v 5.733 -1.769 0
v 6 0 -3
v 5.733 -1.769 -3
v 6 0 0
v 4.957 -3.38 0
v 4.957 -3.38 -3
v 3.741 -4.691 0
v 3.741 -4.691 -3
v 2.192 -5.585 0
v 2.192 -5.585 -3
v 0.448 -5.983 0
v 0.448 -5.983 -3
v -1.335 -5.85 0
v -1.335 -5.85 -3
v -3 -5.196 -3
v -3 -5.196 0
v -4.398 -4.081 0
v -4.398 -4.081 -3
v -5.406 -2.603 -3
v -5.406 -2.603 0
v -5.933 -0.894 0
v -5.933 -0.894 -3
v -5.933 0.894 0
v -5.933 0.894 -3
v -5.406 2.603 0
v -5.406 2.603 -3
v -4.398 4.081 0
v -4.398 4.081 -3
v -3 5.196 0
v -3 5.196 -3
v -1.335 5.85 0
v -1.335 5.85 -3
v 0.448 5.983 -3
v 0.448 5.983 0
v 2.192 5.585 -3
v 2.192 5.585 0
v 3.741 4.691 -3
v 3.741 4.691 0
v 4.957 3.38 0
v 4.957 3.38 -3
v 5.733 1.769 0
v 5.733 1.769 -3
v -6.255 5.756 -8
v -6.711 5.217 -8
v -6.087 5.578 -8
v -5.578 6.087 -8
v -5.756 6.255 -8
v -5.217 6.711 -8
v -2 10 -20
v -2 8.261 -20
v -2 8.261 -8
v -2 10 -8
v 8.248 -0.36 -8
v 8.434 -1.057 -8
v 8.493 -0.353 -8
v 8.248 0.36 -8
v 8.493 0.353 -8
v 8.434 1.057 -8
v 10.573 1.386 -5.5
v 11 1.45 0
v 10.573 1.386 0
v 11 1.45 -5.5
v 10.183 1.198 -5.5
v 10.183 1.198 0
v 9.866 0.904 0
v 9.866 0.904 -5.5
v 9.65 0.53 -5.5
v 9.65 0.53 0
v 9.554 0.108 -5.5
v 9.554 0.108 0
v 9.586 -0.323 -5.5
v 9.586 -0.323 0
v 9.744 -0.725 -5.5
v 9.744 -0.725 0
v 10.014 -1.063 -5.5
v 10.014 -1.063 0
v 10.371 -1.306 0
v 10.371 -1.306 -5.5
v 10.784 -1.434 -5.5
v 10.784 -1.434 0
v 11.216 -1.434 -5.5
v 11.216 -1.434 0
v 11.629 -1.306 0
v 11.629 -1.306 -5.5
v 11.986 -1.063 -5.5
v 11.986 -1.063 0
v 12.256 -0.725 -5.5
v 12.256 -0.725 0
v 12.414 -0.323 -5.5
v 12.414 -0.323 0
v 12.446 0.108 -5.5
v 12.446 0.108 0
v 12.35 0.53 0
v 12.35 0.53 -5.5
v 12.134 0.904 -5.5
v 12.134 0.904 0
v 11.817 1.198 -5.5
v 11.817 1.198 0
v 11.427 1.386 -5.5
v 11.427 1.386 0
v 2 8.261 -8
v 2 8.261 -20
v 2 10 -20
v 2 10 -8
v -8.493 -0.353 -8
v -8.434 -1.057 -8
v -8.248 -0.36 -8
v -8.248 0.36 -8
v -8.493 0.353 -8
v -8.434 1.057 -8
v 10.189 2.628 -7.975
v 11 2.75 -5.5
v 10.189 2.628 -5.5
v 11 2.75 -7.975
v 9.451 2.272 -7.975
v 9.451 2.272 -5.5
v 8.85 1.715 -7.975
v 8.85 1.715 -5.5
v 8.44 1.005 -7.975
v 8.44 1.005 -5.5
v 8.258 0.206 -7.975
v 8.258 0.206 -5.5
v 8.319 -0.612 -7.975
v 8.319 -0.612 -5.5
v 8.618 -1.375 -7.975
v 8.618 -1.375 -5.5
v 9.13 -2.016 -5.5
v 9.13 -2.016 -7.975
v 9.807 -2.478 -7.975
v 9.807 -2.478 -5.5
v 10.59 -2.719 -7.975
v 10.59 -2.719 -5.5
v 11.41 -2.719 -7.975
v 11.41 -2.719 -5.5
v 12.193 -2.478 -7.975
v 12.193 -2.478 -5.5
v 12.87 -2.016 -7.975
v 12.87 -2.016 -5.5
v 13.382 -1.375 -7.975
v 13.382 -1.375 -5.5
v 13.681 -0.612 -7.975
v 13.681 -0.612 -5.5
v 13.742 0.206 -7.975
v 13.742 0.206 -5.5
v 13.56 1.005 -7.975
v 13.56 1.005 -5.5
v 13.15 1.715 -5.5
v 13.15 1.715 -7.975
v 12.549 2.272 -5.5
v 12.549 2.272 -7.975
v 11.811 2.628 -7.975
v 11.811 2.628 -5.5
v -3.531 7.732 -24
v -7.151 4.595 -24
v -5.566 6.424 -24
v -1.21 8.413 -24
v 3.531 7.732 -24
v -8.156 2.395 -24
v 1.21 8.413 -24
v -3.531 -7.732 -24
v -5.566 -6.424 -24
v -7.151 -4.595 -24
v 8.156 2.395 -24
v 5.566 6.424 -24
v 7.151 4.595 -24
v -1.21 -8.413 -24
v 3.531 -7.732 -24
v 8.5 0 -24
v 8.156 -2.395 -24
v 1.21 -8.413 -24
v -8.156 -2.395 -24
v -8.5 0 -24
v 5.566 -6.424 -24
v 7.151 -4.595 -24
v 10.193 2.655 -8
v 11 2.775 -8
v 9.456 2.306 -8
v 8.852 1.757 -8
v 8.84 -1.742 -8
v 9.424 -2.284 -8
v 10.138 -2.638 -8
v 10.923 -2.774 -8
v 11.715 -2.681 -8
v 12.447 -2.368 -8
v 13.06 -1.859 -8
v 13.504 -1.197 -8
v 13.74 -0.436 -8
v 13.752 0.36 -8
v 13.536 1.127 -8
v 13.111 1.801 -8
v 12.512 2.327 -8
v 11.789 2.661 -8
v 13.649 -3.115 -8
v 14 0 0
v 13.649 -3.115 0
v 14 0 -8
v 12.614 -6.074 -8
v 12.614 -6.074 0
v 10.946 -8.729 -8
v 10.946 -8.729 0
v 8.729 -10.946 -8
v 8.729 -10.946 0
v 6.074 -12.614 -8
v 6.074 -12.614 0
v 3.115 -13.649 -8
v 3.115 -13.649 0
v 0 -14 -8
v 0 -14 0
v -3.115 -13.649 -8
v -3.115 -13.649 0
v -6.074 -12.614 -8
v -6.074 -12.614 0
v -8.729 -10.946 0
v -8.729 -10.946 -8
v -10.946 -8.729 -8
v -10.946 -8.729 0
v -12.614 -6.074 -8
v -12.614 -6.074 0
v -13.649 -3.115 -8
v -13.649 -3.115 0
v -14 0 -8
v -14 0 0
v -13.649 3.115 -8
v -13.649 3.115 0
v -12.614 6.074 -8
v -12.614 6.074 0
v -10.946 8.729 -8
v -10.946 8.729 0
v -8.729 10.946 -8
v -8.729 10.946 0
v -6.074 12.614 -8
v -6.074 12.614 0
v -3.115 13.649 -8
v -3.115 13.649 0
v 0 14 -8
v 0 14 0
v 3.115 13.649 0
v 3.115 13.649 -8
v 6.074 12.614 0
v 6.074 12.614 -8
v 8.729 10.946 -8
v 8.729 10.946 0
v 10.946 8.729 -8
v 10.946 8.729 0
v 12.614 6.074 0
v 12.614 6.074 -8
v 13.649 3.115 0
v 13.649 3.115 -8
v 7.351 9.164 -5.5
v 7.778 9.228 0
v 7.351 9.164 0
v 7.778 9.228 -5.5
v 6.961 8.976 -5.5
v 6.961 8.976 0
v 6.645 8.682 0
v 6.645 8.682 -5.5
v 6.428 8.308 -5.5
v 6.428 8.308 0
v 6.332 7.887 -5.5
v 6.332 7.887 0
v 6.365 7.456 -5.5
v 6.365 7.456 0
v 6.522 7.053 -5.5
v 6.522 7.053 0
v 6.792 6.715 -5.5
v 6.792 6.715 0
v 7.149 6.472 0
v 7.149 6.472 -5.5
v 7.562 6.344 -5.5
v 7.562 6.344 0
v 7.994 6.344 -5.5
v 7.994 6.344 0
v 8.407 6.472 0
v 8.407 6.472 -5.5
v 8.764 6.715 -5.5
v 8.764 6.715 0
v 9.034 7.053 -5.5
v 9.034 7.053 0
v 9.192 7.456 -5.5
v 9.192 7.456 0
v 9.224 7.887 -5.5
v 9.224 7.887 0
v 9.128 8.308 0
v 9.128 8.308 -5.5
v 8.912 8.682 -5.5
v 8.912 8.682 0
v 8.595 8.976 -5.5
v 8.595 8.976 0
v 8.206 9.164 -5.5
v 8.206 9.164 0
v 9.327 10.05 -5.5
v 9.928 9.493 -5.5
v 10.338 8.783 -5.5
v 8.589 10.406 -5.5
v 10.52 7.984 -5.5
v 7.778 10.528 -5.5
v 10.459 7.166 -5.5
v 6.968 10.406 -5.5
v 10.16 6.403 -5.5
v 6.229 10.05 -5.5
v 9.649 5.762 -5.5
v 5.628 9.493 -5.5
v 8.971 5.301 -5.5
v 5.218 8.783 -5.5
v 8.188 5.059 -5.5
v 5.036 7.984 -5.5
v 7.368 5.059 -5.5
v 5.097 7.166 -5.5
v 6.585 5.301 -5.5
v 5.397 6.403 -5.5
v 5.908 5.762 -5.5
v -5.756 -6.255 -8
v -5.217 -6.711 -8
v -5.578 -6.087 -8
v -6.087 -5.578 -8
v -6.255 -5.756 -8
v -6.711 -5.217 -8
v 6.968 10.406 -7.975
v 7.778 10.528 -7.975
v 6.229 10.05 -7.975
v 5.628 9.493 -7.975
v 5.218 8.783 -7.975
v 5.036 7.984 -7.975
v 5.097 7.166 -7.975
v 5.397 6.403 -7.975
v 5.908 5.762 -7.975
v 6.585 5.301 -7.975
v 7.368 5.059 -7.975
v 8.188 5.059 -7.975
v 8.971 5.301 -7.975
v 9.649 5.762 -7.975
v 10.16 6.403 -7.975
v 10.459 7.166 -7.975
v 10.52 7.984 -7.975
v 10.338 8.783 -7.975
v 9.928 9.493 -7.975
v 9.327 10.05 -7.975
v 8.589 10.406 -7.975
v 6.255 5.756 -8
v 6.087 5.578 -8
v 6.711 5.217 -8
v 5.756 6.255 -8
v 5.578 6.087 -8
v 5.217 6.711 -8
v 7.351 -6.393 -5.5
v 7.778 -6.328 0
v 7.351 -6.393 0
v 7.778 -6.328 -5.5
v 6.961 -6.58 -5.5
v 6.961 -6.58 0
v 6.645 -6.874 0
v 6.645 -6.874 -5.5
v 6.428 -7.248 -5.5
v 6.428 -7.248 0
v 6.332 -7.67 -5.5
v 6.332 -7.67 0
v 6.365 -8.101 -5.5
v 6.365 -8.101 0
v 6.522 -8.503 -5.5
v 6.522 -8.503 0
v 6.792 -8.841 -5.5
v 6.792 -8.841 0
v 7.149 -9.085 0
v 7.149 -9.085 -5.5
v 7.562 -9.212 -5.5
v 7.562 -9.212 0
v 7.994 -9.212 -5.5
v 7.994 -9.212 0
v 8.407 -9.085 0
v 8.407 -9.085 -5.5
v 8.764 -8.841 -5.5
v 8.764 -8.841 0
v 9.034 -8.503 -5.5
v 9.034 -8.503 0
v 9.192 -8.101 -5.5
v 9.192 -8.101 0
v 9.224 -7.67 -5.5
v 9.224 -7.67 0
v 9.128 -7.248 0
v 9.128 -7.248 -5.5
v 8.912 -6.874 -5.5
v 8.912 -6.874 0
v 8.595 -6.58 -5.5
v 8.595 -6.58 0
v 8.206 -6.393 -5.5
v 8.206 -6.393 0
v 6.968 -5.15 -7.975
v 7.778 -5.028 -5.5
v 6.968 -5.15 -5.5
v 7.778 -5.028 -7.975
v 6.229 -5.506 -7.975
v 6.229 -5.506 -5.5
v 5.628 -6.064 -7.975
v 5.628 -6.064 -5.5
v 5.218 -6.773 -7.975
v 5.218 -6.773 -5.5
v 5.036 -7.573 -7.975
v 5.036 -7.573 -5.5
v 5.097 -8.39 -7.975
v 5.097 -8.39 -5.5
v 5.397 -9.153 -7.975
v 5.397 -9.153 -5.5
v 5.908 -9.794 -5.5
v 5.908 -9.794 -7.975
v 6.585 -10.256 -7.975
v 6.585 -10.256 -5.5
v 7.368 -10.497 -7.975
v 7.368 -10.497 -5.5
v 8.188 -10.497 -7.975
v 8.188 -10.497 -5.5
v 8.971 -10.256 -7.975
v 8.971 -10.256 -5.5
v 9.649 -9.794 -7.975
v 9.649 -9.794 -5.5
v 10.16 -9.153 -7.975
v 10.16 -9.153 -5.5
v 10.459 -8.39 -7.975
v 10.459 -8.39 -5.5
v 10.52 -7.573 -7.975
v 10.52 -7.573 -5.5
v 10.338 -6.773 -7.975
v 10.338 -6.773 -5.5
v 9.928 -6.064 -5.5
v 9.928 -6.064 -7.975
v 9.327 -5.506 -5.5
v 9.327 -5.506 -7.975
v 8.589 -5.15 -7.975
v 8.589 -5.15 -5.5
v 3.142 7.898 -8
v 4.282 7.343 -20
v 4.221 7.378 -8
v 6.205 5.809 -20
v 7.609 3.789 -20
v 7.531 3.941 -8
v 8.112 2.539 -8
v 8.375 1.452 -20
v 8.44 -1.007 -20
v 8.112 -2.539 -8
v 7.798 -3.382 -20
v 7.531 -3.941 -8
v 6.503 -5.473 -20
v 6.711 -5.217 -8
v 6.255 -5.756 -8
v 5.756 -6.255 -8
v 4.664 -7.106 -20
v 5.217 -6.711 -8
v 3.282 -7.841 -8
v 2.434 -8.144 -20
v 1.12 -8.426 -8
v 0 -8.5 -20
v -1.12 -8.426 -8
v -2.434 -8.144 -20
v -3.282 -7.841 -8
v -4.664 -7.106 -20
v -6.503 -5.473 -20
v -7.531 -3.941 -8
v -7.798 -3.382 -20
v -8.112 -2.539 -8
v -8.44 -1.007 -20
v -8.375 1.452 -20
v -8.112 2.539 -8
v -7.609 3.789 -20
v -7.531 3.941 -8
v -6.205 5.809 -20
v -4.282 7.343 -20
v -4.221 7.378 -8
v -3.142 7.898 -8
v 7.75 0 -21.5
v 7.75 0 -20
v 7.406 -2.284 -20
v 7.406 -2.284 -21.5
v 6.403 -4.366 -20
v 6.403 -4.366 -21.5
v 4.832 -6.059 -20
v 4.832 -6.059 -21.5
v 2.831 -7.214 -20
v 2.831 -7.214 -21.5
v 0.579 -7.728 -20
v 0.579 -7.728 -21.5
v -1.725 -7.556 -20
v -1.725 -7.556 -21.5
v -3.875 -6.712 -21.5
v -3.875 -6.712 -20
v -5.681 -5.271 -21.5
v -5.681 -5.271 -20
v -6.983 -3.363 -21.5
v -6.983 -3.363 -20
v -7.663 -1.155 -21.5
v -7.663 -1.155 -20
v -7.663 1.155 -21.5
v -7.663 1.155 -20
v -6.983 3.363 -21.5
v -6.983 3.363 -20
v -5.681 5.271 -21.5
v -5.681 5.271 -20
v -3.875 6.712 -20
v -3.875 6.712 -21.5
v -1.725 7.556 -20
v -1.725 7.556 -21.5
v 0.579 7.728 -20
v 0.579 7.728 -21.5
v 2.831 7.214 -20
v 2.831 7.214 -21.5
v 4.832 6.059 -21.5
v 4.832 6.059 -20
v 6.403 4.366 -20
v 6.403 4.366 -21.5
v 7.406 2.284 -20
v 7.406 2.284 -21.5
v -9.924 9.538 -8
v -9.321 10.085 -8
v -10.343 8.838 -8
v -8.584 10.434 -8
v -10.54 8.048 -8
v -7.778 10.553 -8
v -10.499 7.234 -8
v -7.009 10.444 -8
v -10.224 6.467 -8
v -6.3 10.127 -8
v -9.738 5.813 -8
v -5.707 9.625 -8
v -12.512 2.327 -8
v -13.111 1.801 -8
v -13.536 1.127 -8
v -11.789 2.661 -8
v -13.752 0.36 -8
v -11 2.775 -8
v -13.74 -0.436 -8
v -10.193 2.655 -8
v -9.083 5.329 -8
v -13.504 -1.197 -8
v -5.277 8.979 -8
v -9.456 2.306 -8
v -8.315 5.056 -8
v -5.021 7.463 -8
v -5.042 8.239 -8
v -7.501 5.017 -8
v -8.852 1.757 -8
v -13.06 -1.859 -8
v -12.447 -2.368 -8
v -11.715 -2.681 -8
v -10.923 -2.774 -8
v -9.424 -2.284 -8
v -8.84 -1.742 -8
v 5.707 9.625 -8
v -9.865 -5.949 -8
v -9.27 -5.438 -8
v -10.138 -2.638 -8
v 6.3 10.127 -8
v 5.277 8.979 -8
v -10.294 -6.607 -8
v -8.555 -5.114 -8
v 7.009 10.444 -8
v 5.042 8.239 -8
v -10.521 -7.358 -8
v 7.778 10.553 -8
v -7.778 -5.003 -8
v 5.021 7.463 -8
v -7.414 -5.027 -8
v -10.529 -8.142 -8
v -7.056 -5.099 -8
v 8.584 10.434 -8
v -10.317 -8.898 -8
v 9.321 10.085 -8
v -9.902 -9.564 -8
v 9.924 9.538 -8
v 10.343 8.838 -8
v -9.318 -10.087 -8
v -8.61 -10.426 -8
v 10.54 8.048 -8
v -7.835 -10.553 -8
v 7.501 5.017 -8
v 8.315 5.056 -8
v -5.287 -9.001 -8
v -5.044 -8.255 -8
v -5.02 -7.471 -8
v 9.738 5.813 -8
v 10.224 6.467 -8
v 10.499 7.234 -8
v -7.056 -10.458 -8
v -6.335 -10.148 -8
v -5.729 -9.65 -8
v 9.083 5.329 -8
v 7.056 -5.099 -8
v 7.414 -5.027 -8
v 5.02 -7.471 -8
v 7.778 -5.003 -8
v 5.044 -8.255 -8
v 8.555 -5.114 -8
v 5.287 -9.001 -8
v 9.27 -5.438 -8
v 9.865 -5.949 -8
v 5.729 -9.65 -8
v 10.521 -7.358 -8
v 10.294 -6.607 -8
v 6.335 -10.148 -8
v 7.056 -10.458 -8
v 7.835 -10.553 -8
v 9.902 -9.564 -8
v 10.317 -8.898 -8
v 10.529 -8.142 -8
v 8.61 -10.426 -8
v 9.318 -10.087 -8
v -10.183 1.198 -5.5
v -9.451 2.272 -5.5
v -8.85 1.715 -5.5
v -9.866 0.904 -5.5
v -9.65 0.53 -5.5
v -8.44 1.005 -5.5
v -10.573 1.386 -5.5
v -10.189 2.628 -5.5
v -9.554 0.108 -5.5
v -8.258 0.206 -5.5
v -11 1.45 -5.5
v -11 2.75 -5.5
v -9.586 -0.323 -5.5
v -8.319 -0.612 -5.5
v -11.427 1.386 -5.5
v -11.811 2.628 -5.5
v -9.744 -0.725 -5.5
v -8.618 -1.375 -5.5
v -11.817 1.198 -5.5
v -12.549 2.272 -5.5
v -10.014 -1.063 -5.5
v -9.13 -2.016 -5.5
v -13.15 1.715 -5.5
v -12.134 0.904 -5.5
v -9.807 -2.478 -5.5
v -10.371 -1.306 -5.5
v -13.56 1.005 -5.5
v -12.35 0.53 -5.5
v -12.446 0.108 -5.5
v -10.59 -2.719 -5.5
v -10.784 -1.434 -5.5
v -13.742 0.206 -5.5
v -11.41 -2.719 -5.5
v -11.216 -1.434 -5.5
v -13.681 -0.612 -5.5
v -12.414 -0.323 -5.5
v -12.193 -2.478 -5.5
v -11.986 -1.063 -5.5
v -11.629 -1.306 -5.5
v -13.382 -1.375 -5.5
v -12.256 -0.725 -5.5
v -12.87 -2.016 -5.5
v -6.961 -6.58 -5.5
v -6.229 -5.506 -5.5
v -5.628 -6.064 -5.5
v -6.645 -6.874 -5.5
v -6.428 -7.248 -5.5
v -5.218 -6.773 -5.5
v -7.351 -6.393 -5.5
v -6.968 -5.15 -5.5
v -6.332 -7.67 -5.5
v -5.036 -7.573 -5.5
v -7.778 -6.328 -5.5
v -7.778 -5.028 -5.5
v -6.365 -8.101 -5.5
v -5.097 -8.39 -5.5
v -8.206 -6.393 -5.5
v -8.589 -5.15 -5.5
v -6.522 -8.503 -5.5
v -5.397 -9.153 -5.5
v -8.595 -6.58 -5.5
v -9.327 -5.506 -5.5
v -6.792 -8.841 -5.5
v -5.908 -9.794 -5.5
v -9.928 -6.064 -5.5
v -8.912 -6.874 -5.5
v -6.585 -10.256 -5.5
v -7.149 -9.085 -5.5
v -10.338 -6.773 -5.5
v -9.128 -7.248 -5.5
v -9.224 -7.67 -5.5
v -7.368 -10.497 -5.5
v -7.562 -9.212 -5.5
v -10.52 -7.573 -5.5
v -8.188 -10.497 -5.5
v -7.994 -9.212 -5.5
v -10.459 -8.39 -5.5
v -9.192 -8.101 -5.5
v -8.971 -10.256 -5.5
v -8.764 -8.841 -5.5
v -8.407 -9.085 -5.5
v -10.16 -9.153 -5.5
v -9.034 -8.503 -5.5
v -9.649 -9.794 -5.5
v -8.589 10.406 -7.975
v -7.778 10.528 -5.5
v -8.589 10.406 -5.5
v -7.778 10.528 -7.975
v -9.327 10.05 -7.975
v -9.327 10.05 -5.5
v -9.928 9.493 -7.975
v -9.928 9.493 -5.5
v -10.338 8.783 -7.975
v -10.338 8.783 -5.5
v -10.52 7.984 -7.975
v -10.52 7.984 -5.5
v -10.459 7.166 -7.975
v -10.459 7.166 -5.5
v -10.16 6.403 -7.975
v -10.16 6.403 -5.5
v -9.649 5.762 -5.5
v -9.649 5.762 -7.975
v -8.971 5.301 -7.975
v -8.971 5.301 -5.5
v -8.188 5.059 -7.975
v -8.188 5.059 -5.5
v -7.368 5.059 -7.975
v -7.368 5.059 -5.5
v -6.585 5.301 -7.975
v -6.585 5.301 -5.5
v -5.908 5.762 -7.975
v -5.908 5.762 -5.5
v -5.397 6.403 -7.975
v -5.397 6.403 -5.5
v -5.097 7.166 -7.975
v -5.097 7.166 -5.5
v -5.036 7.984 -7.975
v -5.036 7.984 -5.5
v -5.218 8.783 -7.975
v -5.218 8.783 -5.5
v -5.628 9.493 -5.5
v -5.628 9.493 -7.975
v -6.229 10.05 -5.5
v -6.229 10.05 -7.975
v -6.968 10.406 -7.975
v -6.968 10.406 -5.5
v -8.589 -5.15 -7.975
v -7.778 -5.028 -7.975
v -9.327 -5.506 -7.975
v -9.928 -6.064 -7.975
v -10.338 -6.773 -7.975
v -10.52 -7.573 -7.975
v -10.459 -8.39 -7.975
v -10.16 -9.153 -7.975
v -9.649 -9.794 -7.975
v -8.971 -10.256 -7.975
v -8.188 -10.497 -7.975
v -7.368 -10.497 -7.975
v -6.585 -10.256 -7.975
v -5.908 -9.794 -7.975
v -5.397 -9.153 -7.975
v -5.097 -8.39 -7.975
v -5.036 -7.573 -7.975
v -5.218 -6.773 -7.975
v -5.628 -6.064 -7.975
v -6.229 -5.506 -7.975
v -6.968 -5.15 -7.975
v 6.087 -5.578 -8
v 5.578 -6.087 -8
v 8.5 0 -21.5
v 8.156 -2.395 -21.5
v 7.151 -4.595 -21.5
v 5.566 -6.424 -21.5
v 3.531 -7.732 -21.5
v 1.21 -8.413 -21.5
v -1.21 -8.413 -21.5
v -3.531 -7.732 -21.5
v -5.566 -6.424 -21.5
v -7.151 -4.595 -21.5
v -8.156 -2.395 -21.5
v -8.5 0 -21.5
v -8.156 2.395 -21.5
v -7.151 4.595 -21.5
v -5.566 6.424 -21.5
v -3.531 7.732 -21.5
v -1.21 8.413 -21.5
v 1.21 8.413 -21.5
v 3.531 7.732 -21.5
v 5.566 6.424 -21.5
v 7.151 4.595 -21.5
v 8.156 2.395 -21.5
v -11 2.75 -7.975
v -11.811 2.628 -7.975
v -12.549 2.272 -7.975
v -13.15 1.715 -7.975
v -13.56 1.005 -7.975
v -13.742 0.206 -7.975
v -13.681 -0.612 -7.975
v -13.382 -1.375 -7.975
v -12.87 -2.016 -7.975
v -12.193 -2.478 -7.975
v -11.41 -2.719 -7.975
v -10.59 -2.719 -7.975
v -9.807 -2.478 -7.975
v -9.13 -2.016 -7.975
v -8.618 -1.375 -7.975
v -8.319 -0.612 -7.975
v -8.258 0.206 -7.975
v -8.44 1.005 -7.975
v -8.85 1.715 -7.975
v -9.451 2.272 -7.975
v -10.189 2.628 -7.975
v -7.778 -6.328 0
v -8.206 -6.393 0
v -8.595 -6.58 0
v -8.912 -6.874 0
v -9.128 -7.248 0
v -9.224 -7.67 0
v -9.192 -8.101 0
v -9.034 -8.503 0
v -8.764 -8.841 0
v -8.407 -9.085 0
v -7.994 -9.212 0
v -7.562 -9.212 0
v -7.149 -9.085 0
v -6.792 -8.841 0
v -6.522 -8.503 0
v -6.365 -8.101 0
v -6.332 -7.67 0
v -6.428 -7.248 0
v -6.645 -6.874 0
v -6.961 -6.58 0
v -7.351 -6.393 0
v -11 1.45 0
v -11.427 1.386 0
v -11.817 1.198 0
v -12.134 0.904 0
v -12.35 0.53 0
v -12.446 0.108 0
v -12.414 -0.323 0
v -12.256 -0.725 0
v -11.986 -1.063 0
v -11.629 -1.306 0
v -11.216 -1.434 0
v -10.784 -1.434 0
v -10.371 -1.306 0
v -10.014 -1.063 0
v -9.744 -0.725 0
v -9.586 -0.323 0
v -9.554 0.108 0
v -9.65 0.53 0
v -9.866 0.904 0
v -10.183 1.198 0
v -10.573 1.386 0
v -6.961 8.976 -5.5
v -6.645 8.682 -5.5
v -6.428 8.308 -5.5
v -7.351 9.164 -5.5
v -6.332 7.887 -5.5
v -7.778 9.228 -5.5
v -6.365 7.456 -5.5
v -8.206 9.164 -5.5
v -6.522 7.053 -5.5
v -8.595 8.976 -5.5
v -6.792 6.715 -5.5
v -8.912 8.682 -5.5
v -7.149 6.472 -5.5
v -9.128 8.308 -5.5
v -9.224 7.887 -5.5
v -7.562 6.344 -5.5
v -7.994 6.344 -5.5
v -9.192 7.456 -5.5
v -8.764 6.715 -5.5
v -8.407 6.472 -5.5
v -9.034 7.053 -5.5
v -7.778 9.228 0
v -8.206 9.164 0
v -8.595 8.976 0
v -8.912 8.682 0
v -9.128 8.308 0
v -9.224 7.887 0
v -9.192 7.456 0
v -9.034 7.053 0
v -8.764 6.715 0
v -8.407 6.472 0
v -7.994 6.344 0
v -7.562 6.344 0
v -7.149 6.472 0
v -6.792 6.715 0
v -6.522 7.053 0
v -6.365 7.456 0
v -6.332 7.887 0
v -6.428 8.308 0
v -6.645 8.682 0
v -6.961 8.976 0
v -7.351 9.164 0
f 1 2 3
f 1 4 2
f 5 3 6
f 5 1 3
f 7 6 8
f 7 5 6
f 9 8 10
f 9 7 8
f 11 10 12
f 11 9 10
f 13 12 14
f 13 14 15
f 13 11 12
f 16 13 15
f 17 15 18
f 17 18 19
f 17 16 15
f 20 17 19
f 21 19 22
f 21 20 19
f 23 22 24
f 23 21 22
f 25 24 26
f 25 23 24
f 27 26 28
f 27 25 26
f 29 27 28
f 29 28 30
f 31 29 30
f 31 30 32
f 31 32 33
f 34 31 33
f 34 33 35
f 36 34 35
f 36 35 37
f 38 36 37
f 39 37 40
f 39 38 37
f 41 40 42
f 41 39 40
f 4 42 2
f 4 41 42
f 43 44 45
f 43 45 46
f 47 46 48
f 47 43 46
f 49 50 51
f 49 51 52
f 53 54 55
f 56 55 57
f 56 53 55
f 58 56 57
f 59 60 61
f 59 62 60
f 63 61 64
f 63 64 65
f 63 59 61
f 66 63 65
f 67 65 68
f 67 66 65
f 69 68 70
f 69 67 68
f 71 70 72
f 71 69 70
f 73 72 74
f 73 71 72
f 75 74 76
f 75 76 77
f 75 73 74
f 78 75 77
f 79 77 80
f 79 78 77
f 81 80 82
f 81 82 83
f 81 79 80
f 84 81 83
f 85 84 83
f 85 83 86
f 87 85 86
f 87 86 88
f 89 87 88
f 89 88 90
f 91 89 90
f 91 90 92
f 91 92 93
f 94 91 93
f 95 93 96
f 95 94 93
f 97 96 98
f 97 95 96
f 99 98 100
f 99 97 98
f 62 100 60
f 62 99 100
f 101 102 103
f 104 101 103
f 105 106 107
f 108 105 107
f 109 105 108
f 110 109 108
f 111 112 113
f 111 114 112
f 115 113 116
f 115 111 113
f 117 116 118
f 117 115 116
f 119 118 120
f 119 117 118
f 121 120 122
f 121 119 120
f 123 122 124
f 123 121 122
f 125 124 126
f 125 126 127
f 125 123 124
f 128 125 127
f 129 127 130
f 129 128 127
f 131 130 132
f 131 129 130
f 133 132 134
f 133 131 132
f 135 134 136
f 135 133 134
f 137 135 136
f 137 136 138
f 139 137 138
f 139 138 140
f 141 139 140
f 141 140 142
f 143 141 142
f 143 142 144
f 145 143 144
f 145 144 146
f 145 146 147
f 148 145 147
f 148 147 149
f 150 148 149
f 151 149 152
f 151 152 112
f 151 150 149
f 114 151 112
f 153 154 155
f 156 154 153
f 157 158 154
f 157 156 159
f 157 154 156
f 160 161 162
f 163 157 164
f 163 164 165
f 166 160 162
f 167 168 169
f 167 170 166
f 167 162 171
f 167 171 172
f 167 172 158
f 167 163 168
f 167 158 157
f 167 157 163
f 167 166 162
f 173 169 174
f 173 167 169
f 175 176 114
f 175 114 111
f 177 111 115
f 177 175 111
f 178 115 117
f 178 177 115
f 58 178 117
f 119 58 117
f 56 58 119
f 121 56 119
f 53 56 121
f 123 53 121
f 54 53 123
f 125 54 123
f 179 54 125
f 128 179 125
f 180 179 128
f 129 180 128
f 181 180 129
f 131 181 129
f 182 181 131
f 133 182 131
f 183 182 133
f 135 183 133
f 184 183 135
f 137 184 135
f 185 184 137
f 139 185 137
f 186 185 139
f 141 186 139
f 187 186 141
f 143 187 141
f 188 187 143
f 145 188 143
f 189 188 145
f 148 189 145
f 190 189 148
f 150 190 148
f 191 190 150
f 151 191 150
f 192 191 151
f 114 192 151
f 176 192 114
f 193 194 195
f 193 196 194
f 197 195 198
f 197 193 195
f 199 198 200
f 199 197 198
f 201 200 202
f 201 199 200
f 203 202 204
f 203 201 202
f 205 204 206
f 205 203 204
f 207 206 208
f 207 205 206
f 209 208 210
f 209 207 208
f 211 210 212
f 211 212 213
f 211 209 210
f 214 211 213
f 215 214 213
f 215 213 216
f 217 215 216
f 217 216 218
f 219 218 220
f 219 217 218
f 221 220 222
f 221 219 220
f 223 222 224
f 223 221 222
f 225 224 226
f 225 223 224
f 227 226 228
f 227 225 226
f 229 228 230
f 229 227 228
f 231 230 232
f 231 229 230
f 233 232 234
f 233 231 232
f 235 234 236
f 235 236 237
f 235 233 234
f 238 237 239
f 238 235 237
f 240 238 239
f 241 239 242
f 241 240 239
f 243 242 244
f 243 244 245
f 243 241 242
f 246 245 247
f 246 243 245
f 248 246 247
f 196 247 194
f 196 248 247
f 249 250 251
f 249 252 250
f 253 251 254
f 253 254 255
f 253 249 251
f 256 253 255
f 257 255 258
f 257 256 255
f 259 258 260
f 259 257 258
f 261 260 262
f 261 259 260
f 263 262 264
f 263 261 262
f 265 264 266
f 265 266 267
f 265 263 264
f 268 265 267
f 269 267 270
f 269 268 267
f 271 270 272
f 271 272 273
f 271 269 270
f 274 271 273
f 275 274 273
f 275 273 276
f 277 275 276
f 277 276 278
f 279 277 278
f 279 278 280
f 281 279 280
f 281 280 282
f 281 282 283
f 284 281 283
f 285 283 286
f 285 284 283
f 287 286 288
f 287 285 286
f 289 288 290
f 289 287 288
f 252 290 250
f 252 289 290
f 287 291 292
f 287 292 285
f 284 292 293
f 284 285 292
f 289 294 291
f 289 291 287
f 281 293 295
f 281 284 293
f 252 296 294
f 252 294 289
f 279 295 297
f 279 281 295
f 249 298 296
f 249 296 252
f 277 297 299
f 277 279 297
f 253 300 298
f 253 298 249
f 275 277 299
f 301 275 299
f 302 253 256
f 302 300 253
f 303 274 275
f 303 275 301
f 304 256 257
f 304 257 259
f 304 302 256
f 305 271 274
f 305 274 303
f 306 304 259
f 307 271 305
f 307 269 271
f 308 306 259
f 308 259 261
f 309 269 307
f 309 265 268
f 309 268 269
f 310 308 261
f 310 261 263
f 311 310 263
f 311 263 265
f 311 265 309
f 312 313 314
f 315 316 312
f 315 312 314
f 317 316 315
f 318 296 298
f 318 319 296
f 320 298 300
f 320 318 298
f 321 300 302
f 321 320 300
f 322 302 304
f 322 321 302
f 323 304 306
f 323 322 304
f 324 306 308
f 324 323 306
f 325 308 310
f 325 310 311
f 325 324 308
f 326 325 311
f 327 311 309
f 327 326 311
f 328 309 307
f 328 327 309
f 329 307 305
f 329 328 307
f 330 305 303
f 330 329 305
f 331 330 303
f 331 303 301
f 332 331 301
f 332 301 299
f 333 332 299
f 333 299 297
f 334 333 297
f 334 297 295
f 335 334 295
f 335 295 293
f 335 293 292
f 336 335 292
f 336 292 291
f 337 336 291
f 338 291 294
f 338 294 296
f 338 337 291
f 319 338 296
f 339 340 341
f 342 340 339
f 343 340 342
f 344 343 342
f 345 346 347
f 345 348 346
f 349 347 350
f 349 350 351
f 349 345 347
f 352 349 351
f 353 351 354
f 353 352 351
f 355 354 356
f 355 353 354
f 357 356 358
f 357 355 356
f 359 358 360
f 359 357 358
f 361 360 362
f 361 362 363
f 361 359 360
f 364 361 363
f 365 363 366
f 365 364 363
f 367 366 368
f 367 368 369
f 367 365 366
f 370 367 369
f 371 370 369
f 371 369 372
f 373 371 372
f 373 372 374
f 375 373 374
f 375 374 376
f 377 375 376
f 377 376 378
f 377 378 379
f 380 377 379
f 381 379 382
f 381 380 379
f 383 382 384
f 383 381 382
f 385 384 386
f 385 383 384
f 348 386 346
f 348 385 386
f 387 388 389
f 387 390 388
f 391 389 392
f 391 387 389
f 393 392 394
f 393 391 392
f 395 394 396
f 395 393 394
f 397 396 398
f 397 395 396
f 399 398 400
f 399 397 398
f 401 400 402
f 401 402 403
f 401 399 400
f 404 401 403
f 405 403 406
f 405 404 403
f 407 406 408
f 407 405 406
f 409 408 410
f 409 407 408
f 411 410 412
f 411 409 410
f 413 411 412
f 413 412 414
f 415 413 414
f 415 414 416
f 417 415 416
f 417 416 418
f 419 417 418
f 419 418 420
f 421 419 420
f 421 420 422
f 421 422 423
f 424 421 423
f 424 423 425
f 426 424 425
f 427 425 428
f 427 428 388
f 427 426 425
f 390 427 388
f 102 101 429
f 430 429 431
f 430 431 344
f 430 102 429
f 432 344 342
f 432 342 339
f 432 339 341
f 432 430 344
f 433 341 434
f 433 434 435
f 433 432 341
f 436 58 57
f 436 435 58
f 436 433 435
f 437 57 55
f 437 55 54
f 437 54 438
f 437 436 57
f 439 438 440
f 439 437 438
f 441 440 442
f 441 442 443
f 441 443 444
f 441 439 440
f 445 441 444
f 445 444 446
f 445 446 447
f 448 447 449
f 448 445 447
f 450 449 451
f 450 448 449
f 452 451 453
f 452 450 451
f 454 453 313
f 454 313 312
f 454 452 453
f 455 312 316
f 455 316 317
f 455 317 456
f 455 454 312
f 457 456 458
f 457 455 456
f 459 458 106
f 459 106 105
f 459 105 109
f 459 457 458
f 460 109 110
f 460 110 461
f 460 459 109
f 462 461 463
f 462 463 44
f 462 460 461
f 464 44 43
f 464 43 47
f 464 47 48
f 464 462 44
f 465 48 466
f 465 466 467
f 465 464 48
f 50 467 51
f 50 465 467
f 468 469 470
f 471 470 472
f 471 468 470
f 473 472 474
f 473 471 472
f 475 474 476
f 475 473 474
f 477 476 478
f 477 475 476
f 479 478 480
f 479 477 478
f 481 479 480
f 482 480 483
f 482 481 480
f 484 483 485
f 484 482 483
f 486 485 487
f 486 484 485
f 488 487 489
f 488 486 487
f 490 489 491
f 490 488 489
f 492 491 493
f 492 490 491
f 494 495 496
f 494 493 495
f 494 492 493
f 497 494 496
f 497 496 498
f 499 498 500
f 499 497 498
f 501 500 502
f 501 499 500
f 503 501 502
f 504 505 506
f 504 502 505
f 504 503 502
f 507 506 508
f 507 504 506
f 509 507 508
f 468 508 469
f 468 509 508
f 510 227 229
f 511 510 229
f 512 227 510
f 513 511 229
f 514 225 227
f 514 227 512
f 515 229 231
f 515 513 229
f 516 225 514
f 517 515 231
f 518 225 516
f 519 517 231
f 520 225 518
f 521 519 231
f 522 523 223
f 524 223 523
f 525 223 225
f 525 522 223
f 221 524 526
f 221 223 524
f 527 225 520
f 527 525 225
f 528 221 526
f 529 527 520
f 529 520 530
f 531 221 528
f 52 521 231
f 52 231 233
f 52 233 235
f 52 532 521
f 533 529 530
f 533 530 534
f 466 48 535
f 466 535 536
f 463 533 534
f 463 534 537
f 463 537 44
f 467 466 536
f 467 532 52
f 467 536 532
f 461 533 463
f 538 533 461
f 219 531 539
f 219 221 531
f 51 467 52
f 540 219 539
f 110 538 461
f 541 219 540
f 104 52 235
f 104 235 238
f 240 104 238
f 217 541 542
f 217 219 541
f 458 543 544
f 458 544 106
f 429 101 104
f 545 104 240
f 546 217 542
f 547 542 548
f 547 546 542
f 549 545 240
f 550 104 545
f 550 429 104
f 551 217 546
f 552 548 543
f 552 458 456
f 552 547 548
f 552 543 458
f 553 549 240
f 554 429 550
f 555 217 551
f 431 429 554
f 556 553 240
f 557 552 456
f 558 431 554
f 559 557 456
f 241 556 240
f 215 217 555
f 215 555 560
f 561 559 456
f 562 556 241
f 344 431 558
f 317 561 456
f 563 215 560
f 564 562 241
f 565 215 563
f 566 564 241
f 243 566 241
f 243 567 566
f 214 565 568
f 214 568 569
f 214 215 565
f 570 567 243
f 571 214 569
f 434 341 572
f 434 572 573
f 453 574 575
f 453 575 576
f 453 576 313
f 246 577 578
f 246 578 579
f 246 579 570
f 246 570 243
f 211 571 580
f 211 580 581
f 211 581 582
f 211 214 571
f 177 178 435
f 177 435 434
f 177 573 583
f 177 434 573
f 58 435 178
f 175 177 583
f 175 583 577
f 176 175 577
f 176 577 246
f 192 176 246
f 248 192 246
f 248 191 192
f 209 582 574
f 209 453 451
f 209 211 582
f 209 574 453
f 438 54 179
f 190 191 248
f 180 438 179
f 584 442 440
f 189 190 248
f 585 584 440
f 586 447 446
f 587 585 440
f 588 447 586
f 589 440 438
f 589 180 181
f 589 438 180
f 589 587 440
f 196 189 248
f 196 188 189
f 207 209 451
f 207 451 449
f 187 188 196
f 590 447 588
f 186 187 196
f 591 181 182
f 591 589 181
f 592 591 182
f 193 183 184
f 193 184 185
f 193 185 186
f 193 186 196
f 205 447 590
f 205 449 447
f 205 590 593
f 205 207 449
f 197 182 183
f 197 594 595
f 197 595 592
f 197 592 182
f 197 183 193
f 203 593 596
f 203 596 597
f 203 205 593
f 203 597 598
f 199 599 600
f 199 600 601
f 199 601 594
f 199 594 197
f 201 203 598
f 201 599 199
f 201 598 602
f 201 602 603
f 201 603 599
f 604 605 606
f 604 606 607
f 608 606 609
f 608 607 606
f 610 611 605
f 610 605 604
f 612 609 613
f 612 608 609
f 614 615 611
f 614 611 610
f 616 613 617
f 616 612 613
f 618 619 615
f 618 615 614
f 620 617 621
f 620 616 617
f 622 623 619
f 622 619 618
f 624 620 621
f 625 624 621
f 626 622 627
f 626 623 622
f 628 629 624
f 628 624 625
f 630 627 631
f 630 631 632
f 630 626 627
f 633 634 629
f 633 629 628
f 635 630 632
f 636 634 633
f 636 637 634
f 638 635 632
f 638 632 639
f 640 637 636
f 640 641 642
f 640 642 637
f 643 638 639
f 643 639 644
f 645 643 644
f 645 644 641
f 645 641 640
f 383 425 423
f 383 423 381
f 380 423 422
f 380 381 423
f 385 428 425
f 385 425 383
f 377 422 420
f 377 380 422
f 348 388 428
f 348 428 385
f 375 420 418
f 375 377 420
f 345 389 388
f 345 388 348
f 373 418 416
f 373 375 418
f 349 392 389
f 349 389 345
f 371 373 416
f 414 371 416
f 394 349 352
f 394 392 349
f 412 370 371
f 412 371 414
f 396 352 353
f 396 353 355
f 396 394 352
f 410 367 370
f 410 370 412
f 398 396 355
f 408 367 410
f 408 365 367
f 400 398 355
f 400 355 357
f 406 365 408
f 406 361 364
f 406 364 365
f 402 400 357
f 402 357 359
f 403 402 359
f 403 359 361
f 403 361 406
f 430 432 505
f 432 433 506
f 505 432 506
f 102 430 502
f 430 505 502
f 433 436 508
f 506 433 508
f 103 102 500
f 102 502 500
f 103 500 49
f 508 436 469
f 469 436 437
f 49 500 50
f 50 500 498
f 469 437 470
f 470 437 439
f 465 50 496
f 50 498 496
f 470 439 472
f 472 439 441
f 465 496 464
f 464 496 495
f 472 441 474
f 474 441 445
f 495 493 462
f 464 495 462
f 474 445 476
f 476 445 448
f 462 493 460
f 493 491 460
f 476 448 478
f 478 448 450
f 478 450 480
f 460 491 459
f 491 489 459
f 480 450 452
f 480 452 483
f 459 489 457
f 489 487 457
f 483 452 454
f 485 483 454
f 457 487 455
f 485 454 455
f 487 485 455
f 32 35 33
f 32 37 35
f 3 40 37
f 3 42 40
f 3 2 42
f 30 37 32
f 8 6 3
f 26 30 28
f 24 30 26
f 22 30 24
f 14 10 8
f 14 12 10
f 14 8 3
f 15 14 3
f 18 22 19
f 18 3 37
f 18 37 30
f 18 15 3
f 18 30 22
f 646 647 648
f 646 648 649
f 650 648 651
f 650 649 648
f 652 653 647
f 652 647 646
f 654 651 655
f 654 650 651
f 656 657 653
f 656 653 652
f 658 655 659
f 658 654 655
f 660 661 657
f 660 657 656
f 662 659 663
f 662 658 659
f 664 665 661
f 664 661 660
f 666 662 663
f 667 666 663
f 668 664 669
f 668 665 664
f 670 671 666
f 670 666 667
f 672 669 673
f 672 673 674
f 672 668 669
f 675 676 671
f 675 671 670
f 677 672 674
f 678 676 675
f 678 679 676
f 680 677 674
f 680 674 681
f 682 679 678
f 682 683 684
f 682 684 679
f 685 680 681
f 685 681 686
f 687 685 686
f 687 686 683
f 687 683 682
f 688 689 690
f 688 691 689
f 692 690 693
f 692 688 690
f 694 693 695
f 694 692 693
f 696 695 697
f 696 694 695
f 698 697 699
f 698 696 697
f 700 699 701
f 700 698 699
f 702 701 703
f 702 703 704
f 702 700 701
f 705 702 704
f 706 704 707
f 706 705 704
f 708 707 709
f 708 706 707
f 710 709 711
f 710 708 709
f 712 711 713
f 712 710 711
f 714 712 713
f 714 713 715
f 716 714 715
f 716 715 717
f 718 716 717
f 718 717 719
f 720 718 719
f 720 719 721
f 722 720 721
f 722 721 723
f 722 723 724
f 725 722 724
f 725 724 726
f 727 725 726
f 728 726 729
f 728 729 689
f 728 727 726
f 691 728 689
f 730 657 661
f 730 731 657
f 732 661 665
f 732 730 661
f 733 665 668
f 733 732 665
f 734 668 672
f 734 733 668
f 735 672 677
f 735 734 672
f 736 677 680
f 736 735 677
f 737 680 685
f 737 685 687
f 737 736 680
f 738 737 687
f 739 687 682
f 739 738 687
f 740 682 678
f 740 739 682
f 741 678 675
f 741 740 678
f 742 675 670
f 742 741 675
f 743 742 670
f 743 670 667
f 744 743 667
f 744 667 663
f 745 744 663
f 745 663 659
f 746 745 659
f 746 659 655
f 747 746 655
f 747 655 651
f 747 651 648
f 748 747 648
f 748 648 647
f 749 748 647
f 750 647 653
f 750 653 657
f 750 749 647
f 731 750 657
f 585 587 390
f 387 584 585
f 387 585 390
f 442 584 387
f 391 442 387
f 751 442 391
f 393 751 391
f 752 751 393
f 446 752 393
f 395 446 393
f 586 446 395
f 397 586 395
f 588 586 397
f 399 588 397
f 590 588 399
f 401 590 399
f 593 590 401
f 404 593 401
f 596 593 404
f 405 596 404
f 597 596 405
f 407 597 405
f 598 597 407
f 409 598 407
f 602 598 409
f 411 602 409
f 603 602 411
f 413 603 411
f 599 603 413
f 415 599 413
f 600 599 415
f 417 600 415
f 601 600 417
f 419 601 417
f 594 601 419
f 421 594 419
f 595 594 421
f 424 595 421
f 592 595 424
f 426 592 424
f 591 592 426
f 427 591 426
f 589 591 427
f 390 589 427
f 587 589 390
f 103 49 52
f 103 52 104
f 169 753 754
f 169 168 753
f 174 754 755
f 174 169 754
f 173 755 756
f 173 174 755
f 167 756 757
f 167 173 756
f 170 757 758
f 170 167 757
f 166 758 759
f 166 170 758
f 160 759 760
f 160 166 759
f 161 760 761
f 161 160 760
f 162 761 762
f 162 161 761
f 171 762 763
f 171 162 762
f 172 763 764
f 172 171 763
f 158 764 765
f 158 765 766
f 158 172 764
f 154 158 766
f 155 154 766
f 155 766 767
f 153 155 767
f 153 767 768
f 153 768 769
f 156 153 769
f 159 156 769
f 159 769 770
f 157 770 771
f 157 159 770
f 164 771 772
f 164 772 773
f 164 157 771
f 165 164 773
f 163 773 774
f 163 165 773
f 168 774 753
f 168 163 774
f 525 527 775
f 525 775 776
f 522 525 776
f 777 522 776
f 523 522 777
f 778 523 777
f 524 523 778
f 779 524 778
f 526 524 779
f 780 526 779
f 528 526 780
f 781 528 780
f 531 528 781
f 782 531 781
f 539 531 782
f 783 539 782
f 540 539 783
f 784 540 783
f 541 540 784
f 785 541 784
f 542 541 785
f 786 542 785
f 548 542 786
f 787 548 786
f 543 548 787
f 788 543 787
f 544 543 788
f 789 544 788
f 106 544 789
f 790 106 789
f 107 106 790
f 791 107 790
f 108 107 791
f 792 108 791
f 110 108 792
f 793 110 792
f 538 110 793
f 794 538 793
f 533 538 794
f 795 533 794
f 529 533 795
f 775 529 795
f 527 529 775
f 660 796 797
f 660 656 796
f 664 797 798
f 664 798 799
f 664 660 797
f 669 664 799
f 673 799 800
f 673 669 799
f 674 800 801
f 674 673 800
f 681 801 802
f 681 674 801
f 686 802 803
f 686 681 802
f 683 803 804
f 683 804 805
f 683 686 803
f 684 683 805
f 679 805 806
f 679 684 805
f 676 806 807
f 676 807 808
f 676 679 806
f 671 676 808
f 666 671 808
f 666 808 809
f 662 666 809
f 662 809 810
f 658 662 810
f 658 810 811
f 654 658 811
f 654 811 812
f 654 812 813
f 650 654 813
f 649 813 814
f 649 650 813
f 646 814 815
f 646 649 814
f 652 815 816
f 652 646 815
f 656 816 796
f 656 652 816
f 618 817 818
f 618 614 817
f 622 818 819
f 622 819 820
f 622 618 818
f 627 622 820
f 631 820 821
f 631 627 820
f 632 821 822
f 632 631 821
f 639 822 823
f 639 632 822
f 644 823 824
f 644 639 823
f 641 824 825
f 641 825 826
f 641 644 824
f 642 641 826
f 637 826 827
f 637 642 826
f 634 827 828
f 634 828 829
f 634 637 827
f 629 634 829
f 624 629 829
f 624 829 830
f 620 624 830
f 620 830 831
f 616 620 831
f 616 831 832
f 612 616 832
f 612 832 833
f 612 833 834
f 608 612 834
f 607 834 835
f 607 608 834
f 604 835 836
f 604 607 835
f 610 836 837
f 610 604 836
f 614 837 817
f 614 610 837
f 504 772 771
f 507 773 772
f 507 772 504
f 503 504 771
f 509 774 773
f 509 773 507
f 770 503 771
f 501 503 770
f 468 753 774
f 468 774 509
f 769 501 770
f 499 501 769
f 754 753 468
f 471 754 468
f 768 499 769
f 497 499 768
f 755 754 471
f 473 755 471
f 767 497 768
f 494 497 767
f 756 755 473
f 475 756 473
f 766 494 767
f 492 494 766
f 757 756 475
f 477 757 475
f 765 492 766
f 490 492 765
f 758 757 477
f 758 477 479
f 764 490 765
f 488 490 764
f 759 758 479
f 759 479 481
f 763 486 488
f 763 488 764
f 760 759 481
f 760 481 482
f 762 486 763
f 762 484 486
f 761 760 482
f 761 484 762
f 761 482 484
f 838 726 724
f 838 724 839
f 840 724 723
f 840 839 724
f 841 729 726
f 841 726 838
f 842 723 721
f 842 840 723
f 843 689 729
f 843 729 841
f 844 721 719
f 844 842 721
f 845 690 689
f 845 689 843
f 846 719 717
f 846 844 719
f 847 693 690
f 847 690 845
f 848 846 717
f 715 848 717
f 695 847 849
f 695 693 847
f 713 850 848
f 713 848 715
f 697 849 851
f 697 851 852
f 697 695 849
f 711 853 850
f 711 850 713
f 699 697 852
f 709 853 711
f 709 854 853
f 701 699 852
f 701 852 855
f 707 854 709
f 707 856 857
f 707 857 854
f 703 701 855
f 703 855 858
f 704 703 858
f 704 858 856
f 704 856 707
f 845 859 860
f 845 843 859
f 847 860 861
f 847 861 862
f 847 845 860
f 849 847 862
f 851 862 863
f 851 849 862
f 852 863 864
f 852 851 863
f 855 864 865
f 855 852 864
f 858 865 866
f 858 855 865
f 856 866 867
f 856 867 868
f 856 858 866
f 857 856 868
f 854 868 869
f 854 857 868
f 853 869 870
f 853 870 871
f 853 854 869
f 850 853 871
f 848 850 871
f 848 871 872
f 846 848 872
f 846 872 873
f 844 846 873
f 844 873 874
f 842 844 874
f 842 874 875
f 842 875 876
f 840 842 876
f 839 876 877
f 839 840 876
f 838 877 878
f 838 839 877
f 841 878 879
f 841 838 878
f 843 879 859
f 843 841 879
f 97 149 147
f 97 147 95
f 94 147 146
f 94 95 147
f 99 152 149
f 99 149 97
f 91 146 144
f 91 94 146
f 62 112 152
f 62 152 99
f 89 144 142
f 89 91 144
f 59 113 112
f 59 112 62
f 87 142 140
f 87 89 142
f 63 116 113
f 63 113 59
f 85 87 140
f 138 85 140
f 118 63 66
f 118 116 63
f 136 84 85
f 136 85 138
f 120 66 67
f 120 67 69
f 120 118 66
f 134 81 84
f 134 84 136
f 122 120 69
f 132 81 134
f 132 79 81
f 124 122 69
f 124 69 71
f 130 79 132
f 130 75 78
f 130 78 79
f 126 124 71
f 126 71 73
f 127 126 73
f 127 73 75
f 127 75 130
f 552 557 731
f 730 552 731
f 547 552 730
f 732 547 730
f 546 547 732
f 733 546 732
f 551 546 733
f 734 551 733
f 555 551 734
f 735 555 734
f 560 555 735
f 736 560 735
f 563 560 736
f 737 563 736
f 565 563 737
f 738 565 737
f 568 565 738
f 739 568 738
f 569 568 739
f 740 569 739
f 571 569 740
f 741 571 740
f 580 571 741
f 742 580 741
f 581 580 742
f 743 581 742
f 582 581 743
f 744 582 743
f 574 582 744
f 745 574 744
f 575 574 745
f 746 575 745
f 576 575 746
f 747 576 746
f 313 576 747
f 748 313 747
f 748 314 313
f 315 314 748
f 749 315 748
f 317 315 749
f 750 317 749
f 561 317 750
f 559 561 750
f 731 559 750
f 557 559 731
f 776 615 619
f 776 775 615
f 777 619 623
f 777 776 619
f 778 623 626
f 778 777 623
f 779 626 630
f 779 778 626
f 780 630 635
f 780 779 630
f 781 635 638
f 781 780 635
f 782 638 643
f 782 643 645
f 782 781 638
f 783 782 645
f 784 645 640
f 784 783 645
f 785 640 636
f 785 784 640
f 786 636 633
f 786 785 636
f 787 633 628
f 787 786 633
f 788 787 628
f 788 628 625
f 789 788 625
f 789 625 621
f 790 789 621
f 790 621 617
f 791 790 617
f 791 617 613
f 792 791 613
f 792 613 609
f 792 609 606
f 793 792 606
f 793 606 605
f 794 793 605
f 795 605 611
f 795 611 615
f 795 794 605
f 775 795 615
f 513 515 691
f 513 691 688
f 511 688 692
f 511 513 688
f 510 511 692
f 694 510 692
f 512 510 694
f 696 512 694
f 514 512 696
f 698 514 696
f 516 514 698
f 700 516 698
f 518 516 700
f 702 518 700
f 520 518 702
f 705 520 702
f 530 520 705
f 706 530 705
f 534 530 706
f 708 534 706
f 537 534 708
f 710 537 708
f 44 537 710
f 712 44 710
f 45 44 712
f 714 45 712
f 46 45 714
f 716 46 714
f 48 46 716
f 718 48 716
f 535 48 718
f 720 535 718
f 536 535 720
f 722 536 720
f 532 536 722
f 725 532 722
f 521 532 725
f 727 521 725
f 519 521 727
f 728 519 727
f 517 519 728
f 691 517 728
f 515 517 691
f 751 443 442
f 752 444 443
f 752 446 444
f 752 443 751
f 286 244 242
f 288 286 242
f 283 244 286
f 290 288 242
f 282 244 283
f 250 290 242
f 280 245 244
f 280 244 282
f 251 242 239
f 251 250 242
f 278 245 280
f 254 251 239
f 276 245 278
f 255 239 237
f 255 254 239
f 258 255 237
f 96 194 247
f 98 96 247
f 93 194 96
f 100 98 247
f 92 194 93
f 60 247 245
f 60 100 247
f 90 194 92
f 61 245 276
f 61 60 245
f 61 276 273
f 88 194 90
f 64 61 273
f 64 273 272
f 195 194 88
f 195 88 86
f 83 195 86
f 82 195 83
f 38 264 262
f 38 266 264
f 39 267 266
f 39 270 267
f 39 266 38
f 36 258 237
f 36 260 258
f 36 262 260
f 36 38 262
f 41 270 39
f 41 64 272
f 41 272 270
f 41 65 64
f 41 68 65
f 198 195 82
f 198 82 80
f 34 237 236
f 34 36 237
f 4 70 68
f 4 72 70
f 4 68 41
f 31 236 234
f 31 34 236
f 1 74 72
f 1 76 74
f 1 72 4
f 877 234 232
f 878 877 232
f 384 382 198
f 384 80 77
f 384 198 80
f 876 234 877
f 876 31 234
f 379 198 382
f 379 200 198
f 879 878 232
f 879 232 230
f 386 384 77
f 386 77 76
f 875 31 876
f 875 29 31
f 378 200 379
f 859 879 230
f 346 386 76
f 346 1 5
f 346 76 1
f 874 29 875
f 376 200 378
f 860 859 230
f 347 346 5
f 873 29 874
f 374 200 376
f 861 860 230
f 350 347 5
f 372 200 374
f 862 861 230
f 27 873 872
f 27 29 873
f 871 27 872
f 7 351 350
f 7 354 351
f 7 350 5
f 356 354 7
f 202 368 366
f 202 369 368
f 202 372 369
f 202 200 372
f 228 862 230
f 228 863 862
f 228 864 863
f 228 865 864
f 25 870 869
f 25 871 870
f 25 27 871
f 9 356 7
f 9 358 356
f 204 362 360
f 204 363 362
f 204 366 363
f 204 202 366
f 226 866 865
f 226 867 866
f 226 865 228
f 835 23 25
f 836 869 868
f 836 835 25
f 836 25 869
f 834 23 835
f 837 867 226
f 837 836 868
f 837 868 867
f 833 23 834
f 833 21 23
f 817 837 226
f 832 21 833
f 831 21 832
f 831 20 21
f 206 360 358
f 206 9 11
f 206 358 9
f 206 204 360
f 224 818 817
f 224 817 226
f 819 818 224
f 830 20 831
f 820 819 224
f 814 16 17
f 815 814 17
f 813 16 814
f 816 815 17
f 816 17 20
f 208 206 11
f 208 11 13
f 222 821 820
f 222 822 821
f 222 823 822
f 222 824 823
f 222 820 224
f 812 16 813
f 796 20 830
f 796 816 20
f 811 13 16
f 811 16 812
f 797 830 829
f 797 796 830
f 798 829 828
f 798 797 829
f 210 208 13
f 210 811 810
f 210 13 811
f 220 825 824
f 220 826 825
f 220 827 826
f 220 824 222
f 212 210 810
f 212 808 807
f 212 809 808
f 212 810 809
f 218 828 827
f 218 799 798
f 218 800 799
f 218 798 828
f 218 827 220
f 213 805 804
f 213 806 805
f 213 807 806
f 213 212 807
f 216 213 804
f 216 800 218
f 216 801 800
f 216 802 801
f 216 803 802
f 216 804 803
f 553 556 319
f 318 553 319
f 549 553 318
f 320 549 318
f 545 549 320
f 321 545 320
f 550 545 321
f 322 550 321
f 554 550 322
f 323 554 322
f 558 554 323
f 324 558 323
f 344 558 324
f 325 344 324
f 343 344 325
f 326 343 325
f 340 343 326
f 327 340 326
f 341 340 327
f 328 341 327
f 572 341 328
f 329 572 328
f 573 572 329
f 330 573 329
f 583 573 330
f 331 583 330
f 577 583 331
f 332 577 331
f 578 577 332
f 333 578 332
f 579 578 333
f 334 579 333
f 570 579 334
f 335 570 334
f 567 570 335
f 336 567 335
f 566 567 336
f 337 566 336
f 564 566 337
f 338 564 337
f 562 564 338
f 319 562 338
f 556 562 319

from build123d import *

# Parameters (mm, degrees)
CBORE_FOR_M2_5_SHCS1_AT_2_COUNT = 2
CBORE_FOR_M2_5_SHCS1_AT_2_PITCH = 8.419035512
CBORE_FOR_M2_5_SHCS1_AT_3_COUNT = 2
CBORE_FOR_M2_5_SHCS1_AT_3_PITCH = 20.325349715
CBORE_FOR_M2_5_SHCS1_AT_4_COUNT = 2
CBORE_FOR_M2_5_SHCS1_AT_4_PITCH = 22
CBORE_FOR_M2_5_SHCS1_AT_5_COUNT = 2
CBORE_FOR_M2_5_SHCS1_AT_5_PITCH = 20.325349715
CBORE_FOR_M2_5_SHCS1_AT_6_COUNT = 2
CBORE_FOR_M2_5_SHCS1_AT_6_PITCH = 8.419035512
SKETCH6_W                       = 0.75
SKETCH6_H                       = 1.5
SKETCH8_W                       = 4
SKETCH8_H                       = 4
BOSS_EXTRUDE1_DEPTH             = 12


with BuildPart() as part:
    # Sketch1 → Revolve1 (revolve)
    with BuildSketch(Plane(origin=(0, 0, 0), x_dir=(1, 0, 0), z_dir=(0, 1, 0))):
        Polygon((0, 24), (0, 3), (6, 3), (6, 0), (14, 0), (14, 8), (8.5, 8), (8.5, 24), align=None)
    revolve(axis=Axis((0, 0, 25.877450995), (0, 0, -1)))

    # Sketch4 → CBORE for M2.5 SHCS1 (revolve, cut)
    with BuildSketch(Plane(origin=(-11, 0, -8), x_dir=(0, 1, 0), z_dir=(1, 0, 0))):
        Polygon((0, 0), (0, 8), (1.45, 8), (1.45, 2.5), (2.75, 2.5), (2.75, 0.025), (2.775, 0), align=None)
    cbore_for_m2_5_shcs1 = revolve(axis=Axis((-11, 0, -14.35), (0, 0, 1)), mode=Mode.SUBTRACT)

    # CBORE for M2.5 SHCS1 at 2: CBORE for M2.5 SHCS1 ×2
    with Locations(*[Vector(0.38268343236508967, 0.9238795325112867, 0) * (i * CBORE_FOR_M2_5_SHCS1_AT_2_PITCH) for i in range(1, CBORE_FOR_M2_5_SHCS1_AT_2_COUNT)]):
        add(cbore_for_m2_5_shcs1, mode=Mode.SUBTRACT)

    # CBORE for M2.5 SHCS1 at 3: CBORE for M2.5 SHCS1 ×2
    with Locations(*[Vector(0.9238795325112867, 0.3826834323650897, 0) * (i * CBORE_FOR_M2_5_SHCS1_AT_3_PITCH) for i in range(1, CBORE_FOR_M2_5_SHCS1_AT_3_COUNT)]):
        add(cbore_for_m2_5_shcs1, mode=Mode.SUBTRACT)

    # CBORE for M2.5 SHCS1 at 4: CBORE for M2.5 SHCS1 ×2
    with Locations(*[(i * CBORE_FOR_M2_5_SHCS1_AT_4_PITCH, 0, 0) for i in range(1, CBORE_FOR_M2_5_SHCS1_AT_4_COUNT)]):
        add(cbore_for_m2_5_shcs1, mode=Mode.SUBTRACT)

    # CBORE for M2.5 SHCS1 at 5: CBORE for M2.5 SHCS1 ×2
    with Locations(*[Vector(0.9238795325112867, -0.38268343236508984, 0) * (i * CBORE_FOR_M2_5_SHCS1_AT_5_PITCH) for i in range(1, CBORE_FOR_M2_5_SHCS1_AT_5_COUNT)]):
        add(cbore_for_m2_5_shcs1, mode=Mode.SUBTRACT)

    # CBORE for M2.5 SHCS1 at 6: CBORE for M2.5 SHCS1 ×2
    with Locations(*[Vector(0.38268343236508967, -0.9238795325112868, 0) * (i * CBORE_FOR_M2_5_SHCS1_AT_6_PITCH) for i in range(1, CBORE_FOR_M2_5_SHCS1_AT_6_COUNT)]):
        add(cbore_for_m2_5_shcs1, mode=Mode.SUBTRACT)

    # Sketch6 → Cut-Revolve1 (revolve, cut)
    with BuildSketch(Plane(origin=(0, 0, 0), x_dir=(1, 0, 0), z_dir=(0, 1, 0))):
        with Locations((8.125, 20.75)):
            Rectangle(SKETCH6_W, SKETCH6_H)
    revolve(axis=Axis((0, 0, 6.058618002), (0, 0, -1)), mode=Mode.SUBTRACT)

    # Sketch8 → Boss-Extrude1 (add)
    with BuildSketch(Plane.XY.offset(-20)):
        with Locations((0, 8)):
            Rectangle(SKETCH8_W, SKETCH8_H)
    extrude(amount=BOSS_EXTRUDE1_DEPTH)


solid = part.part
